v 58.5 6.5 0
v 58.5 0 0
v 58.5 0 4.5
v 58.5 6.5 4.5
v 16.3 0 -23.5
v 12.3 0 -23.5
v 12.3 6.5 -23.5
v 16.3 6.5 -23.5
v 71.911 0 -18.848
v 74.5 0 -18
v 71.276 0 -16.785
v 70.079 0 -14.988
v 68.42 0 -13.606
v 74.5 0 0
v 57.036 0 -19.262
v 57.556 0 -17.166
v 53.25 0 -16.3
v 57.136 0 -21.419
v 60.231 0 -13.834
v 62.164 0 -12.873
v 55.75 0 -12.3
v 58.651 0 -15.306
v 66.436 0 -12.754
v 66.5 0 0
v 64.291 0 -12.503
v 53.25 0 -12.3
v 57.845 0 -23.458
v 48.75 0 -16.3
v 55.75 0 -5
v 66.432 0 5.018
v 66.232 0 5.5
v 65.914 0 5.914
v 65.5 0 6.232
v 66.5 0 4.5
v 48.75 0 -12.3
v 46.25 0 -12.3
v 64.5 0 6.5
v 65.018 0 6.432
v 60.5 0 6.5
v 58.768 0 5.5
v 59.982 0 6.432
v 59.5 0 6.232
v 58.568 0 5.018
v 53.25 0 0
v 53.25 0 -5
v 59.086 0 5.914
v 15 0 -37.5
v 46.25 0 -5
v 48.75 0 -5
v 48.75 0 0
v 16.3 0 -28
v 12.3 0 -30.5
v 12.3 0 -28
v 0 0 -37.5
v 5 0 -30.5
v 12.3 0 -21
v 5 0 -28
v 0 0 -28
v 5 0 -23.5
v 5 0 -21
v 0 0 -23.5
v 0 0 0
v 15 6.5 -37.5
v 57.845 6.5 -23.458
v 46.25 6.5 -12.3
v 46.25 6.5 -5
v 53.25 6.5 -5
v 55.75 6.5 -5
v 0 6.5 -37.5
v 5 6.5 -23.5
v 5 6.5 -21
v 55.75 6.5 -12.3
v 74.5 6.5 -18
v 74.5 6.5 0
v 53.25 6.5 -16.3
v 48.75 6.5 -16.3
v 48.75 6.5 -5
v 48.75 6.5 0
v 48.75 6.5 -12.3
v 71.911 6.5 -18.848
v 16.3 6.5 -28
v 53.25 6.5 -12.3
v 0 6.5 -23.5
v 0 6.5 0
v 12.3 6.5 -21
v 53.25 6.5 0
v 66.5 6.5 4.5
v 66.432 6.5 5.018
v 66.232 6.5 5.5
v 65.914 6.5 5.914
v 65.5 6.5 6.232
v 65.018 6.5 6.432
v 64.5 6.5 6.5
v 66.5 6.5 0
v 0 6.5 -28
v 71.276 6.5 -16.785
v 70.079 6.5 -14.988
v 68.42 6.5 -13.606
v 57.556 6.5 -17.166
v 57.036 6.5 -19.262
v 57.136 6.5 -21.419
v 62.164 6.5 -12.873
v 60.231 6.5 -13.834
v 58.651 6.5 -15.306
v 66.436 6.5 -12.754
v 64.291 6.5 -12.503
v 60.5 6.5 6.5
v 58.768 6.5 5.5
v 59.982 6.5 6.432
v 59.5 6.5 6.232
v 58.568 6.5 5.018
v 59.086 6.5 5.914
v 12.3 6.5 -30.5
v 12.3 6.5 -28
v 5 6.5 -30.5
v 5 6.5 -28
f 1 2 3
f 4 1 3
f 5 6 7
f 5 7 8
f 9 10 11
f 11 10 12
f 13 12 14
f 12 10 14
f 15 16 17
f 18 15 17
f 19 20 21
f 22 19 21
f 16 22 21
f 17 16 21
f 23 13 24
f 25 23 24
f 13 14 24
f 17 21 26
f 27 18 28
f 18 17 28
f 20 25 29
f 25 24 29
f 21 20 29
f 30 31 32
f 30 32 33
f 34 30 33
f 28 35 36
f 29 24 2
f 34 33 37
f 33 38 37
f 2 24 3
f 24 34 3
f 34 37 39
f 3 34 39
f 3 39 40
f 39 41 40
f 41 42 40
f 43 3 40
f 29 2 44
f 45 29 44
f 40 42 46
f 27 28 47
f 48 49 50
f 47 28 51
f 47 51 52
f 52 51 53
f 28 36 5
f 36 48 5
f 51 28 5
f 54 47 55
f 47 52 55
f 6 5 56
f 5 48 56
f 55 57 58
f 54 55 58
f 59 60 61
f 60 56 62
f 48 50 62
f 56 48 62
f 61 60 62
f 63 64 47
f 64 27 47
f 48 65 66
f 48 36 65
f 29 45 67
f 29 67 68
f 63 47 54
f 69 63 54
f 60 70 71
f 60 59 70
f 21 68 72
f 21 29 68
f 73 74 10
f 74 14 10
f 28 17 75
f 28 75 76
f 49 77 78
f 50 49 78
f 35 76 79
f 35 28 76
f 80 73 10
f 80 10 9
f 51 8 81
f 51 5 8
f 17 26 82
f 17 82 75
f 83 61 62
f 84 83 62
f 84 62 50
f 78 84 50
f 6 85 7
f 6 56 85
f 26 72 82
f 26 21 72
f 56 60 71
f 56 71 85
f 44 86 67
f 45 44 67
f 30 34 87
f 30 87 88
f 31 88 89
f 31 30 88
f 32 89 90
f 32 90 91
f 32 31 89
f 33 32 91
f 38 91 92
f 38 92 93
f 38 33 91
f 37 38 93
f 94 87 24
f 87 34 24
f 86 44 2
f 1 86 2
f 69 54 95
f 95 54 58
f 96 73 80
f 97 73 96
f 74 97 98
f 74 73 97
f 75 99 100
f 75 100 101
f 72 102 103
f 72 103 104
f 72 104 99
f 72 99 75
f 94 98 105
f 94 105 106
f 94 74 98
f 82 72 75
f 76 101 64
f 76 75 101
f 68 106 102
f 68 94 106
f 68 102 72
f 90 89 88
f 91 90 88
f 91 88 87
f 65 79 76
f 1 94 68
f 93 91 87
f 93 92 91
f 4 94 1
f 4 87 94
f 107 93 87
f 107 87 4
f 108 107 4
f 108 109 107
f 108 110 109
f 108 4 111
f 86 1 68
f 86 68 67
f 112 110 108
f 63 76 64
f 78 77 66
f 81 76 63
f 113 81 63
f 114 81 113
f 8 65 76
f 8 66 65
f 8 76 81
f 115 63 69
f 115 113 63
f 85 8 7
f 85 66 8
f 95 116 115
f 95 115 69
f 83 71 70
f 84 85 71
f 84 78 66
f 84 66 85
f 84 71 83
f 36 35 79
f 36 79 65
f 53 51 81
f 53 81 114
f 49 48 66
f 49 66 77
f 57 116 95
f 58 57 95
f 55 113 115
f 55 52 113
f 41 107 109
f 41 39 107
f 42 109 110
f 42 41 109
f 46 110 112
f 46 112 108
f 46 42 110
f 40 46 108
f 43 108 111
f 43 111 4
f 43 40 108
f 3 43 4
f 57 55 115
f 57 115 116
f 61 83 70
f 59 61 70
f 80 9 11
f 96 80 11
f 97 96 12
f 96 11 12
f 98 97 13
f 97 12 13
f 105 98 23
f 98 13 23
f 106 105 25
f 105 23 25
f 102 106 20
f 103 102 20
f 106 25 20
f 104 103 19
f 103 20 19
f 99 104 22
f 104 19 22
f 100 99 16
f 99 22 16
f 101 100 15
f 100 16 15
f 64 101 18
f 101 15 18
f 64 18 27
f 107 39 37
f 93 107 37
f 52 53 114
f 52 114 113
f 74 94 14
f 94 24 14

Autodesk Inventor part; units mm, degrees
ref_plane "YZ Plane" through (0, 0, 0) normal (1, 0, 0) x (0, 1, 0)
ref_plane "XZ Plane" through (0, 0, 0) normal (0, 1, 0) x (-1, 0, 0)
ref_plane "XY Plane" through (0, 0, 0) normal (0, 0, 1) x (1, 0, 0)
sketch "Sketch1" plane through (0, 0, 0) normal (0, 1, 0) x (-1, 0, 0)
  line L0 (0, -37.5) -> (0, 0)
  line L1 (0, 0) -> (-74.5, 0)
  line L2 (-74.5, 0) -> (-74.5, -18)
  line L3 (-74.5, -18) -> (-15, -37.5)
  line L4 (-15, -37.5) -> (0, -37.5)
  dimension "d0" = 37.5
  dimension "d1" = 74.5
  dimension "d2" = 18
  dimension "d3" = 15
extrude "Extrusion1" add sketch "Sketch1" along normal blind 6.5
sketch "Sketch2" plane through (0, 0, 0) normal (0, -1, 0) x (1, 0, 0)
  line L0 (0, 0) -> (0, -37.5) projected
  line L1 (0, -37.5) -> (15, -37.5) projected
  line L2 (16.3, -23.5) -> (16.3, -28)
  line L3 (0, -28) -> (0, -23.5)
  line L4 (5, -21) -> (12.3, -21)
  line L5 (12.3, -30.5) -> (5, -30.5)
  line L6 (0, -23.5) -> (5, -23.5)
  line L7 (12.3, -23.5) -> (16.3, -23.5)
  line L8 (16.3, -28) -> (12.3, -28)
  line L9 (5, -28) -> (0, -28)
  line L10 (5, -30.5) -> (5, -28)
  line L11 (5, -23.5) -> (5, -21)
  line L12 (12.3, -21) -> (12.3, -23.5)
  line L13 (12.3, -28) -> (12.3, -30.5)
  point P0 (16.3, -25.75)
  dimension "d6" = 4.5
  dimension "d7" = 2.5
  dimension "d8" = 5
  dimension "d9" = 7.3
  dimension "d10" = 4
  dimension "d12" = 14
extrude "Extrusion2" cut sketch "Sketch2" against normal through all
sketch "Sketch3" plane through (0, 0, 0) normal (0, -1, 0) x (1, 0, 0)
  line L0 (74.5, -18) -> (74.5, 0) projected
  line L1 (74.5, 0) -> (0, 0) projected
  line L2 (66.5, 0) -> (58.5, 0)
  line L3 (58.5, 0) -> (58.5, 4.5)
  line L4 (60.5, 6.5) -> (64.5, 6.5)
  line L5 (66.5, 4.5) -> (66.5, 0)
  arc A0 (60.5, 6.5) -> (58.5, 4.5) centre (60.5, 4.5) ccw
  arc A1 (66.5, 4.5) -> (64.5, 6.5) centre (64.5, 4.5) ccw
  dimension "d15" = 2
  dimension "d16" = 8
  dimension "d17" = 6.5
  dimension "d18" = 8
extrude "Extrusion3" add sketch "Sketch3" against normal blind 6.5
sketch "Sketch4" plane through (0, 0, 0) normal (0, -1, 0) x (1, 0, 0)
  line L0 (58.5, 4.5) -> (58.5, 0) projected
  line L1 (58.5, 0) -> (0, 0) projected
  line L2 (48.75, 0) -> (53.25, 0)
  line L3 (53.25, -16.3) -> (48.75, -16.3)
  line L4 (55.75, -5) -> (55.75, -12.3)
  line L5 (46.25, -12.3) -> (46.25, -5)
  line L6 (46.25, -5) -> (48.75, -5)
  line L7 (53.25, -5) -> (55.75, -5)
  line L8 (55.75, -12.3) -> (53.25, -12.3)
  line L9 (48.75, -12.3) -> (46.25, -12.3)
  line L10 (48.75, -16.3) -> (48.75, -12.3)
  line L11 (48.75, -5) -> (48.75, 0)
  line L12 (53.25, 0) -> (53.25, -5)
  line L13 (53.25, -12.3) -> (53.25, -16.3)
  point P0 (51, -16.3)
  dimension "d21" = 4.5
  dimension "d22" = 2.5
  dimension "d23" = 5
  dimension "d24" = 4
  dimension "d25" = 7.3
  dimension "d26" = 7.5
extrude "Extrusion4" cut sketch "Sketch4" against normal through all
sketch "Sketch5" plane through (0, 0, 0) normal (0, -1, 0) x (1, 0, 0)
  line L0 (15, -37.5) -> (74.5, -18) projected
  line L1 (74.5, -18) -> (74.5, 0) projected
  line L2 (74.5, 0) -> (66.5, 0) projected
  arc A0 (71.9111, -18.8485) -> (57.845, -23.4584) centre (64.5, -20) ccw
  dimension "d29" = 15
  dimension "d30" = 20
  dimension "d31" = 10
extrude "Extrusion5" cut sketch "Sketch5" against normal through all
properties part number "x_carryage_brace_bottom"
